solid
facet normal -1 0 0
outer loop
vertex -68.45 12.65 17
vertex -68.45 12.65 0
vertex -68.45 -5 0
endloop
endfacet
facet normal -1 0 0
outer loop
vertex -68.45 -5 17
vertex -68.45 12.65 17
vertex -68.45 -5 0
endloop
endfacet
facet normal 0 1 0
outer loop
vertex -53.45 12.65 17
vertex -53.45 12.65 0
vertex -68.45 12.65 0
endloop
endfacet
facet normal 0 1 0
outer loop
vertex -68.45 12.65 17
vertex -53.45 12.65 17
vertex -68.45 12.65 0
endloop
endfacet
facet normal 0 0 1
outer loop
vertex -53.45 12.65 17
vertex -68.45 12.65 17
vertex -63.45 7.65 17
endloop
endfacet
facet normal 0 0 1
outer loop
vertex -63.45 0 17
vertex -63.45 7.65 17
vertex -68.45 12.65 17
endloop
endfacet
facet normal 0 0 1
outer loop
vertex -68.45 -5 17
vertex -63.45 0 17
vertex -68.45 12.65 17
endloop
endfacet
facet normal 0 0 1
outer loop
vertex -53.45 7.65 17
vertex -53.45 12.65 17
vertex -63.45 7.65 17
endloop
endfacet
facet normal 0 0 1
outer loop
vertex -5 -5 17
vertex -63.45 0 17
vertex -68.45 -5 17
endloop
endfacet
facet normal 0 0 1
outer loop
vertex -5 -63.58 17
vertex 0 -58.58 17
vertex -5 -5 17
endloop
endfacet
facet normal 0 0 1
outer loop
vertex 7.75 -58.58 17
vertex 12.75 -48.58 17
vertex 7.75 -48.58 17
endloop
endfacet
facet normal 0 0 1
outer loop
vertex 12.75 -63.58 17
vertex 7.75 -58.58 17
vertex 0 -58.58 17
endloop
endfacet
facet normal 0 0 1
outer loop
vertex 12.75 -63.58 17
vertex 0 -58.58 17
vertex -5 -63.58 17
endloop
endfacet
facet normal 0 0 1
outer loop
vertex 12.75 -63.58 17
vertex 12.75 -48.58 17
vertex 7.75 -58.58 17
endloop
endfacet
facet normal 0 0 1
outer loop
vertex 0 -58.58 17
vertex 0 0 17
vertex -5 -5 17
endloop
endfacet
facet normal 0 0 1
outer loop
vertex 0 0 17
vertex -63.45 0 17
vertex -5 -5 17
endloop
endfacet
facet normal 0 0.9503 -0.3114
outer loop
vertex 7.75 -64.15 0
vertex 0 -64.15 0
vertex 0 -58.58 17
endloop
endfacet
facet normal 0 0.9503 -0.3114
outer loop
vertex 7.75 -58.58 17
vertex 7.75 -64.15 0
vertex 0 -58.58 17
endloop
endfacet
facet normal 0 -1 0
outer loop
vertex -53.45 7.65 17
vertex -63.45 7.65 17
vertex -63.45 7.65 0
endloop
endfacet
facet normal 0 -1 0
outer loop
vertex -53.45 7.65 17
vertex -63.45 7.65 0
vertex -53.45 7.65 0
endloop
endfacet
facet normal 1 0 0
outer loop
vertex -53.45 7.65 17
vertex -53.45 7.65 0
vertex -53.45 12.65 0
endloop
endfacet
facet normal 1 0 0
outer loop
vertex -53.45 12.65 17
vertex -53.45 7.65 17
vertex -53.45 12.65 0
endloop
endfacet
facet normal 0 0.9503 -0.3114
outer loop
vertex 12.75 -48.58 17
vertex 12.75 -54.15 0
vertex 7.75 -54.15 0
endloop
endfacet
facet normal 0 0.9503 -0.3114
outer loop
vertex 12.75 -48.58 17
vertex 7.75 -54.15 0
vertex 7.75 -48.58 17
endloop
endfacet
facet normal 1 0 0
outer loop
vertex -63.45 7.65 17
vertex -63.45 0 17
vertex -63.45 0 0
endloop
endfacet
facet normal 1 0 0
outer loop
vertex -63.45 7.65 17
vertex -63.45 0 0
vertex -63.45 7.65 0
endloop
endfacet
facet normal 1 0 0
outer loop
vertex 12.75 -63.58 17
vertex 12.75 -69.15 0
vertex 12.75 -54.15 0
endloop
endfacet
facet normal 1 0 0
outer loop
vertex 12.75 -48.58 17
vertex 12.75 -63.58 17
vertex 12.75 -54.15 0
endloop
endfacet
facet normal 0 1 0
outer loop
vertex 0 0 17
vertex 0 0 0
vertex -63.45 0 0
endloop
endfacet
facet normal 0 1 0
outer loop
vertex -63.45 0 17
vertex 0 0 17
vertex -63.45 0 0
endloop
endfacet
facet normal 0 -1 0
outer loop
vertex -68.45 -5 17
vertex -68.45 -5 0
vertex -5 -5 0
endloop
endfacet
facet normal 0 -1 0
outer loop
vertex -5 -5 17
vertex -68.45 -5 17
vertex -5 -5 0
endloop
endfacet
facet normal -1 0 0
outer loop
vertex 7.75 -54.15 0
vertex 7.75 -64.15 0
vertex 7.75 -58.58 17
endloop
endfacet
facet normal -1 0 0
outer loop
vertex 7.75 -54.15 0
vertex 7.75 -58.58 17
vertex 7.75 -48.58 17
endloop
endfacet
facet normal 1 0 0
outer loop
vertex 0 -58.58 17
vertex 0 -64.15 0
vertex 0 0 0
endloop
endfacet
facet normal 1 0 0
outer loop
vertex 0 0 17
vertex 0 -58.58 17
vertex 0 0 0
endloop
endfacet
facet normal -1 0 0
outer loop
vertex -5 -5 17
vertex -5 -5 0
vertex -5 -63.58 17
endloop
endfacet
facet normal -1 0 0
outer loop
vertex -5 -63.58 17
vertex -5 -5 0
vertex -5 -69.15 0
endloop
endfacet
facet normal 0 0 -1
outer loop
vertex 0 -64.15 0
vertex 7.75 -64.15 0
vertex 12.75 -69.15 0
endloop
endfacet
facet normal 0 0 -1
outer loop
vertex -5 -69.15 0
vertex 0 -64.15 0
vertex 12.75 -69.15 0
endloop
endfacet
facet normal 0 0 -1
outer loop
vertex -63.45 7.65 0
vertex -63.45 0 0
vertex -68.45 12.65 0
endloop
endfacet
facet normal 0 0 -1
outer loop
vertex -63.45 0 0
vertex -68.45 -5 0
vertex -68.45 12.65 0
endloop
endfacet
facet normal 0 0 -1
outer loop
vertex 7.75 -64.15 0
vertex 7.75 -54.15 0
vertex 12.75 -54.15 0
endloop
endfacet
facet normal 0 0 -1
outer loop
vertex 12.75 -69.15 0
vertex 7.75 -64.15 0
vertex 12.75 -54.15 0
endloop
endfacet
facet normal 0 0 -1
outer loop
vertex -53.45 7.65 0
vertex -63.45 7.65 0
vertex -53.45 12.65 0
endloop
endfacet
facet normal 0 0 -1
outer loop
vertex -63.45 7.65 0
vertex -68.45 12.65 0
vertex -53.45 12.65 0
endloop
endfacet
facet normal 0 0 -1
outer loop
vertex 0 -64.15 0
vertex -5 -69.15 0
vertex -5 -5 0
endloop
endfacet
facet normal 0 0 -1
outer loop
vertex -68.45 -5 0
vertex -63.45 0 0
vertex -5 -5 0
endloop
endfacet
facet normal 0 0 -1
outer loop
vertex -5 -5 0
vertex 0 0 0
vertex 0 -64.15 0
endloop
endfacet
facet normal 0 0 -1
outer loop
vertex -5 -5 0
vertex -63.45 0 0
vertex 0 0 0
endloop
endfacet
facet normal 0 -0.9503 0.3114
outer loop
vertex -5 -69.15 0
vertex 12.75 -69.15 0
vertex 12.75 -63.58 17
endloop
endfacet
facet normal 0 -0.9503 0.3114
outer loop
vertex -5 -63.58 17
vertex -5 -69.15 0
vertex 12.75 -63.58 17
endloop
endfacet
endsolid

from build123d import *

# Parameters (mm, degrees)
F1_DEPTH = 17
F3_DEPTH = 7.75
F5_DEPTH = 5
F7_DEPTH = 25


with BuildPart() as f1:
    # F0 (on Top) → F1 (new body)
    with BuildSketch(Plane.XY):
        Polygon((0, -64.15), (0, 0), (-63.45, 0), (-63.45, 7.65), (-53.45, 7.65), (-53.45, 12.65), (-68.45, 12.65), (-68.45, -5), (-5, -5), (-5, -69.15), (12.75, -69.15), (12.75, -54.15), (7.75, -54.15), (7.75, -64.15), align=None)
    extrude(amount=F1_DEPTH)

    # F2 (on face) → F3 (join)
    with BuildSketch(Plane.YZ):
        Polygon((-58.58, 17), (-64.15, 17), (-64.15, 0), align=None)
    extrude(amount=F3_DEPTH)

    # F4 (on face) → F5 (join)
    with BuildSketch(Plane.YZ.offset(12.75)):
        Polygon((-48.58, 17), (-54.15, 17), (-54.15, 0), align=None)
    extrude(amount=-F5_DEPTH)

    # F6 (on face) → F7 (cut)
    with BuildSketch(Plane.YZ.offset(12.75)):
        Polygon((-63.58, 17), (-69.15, 17), (-69.15, 0), align=None)
    extrude(amount=-F7_DEPTH, mode=Mode.SUBTRACT)


solid = f1.part
